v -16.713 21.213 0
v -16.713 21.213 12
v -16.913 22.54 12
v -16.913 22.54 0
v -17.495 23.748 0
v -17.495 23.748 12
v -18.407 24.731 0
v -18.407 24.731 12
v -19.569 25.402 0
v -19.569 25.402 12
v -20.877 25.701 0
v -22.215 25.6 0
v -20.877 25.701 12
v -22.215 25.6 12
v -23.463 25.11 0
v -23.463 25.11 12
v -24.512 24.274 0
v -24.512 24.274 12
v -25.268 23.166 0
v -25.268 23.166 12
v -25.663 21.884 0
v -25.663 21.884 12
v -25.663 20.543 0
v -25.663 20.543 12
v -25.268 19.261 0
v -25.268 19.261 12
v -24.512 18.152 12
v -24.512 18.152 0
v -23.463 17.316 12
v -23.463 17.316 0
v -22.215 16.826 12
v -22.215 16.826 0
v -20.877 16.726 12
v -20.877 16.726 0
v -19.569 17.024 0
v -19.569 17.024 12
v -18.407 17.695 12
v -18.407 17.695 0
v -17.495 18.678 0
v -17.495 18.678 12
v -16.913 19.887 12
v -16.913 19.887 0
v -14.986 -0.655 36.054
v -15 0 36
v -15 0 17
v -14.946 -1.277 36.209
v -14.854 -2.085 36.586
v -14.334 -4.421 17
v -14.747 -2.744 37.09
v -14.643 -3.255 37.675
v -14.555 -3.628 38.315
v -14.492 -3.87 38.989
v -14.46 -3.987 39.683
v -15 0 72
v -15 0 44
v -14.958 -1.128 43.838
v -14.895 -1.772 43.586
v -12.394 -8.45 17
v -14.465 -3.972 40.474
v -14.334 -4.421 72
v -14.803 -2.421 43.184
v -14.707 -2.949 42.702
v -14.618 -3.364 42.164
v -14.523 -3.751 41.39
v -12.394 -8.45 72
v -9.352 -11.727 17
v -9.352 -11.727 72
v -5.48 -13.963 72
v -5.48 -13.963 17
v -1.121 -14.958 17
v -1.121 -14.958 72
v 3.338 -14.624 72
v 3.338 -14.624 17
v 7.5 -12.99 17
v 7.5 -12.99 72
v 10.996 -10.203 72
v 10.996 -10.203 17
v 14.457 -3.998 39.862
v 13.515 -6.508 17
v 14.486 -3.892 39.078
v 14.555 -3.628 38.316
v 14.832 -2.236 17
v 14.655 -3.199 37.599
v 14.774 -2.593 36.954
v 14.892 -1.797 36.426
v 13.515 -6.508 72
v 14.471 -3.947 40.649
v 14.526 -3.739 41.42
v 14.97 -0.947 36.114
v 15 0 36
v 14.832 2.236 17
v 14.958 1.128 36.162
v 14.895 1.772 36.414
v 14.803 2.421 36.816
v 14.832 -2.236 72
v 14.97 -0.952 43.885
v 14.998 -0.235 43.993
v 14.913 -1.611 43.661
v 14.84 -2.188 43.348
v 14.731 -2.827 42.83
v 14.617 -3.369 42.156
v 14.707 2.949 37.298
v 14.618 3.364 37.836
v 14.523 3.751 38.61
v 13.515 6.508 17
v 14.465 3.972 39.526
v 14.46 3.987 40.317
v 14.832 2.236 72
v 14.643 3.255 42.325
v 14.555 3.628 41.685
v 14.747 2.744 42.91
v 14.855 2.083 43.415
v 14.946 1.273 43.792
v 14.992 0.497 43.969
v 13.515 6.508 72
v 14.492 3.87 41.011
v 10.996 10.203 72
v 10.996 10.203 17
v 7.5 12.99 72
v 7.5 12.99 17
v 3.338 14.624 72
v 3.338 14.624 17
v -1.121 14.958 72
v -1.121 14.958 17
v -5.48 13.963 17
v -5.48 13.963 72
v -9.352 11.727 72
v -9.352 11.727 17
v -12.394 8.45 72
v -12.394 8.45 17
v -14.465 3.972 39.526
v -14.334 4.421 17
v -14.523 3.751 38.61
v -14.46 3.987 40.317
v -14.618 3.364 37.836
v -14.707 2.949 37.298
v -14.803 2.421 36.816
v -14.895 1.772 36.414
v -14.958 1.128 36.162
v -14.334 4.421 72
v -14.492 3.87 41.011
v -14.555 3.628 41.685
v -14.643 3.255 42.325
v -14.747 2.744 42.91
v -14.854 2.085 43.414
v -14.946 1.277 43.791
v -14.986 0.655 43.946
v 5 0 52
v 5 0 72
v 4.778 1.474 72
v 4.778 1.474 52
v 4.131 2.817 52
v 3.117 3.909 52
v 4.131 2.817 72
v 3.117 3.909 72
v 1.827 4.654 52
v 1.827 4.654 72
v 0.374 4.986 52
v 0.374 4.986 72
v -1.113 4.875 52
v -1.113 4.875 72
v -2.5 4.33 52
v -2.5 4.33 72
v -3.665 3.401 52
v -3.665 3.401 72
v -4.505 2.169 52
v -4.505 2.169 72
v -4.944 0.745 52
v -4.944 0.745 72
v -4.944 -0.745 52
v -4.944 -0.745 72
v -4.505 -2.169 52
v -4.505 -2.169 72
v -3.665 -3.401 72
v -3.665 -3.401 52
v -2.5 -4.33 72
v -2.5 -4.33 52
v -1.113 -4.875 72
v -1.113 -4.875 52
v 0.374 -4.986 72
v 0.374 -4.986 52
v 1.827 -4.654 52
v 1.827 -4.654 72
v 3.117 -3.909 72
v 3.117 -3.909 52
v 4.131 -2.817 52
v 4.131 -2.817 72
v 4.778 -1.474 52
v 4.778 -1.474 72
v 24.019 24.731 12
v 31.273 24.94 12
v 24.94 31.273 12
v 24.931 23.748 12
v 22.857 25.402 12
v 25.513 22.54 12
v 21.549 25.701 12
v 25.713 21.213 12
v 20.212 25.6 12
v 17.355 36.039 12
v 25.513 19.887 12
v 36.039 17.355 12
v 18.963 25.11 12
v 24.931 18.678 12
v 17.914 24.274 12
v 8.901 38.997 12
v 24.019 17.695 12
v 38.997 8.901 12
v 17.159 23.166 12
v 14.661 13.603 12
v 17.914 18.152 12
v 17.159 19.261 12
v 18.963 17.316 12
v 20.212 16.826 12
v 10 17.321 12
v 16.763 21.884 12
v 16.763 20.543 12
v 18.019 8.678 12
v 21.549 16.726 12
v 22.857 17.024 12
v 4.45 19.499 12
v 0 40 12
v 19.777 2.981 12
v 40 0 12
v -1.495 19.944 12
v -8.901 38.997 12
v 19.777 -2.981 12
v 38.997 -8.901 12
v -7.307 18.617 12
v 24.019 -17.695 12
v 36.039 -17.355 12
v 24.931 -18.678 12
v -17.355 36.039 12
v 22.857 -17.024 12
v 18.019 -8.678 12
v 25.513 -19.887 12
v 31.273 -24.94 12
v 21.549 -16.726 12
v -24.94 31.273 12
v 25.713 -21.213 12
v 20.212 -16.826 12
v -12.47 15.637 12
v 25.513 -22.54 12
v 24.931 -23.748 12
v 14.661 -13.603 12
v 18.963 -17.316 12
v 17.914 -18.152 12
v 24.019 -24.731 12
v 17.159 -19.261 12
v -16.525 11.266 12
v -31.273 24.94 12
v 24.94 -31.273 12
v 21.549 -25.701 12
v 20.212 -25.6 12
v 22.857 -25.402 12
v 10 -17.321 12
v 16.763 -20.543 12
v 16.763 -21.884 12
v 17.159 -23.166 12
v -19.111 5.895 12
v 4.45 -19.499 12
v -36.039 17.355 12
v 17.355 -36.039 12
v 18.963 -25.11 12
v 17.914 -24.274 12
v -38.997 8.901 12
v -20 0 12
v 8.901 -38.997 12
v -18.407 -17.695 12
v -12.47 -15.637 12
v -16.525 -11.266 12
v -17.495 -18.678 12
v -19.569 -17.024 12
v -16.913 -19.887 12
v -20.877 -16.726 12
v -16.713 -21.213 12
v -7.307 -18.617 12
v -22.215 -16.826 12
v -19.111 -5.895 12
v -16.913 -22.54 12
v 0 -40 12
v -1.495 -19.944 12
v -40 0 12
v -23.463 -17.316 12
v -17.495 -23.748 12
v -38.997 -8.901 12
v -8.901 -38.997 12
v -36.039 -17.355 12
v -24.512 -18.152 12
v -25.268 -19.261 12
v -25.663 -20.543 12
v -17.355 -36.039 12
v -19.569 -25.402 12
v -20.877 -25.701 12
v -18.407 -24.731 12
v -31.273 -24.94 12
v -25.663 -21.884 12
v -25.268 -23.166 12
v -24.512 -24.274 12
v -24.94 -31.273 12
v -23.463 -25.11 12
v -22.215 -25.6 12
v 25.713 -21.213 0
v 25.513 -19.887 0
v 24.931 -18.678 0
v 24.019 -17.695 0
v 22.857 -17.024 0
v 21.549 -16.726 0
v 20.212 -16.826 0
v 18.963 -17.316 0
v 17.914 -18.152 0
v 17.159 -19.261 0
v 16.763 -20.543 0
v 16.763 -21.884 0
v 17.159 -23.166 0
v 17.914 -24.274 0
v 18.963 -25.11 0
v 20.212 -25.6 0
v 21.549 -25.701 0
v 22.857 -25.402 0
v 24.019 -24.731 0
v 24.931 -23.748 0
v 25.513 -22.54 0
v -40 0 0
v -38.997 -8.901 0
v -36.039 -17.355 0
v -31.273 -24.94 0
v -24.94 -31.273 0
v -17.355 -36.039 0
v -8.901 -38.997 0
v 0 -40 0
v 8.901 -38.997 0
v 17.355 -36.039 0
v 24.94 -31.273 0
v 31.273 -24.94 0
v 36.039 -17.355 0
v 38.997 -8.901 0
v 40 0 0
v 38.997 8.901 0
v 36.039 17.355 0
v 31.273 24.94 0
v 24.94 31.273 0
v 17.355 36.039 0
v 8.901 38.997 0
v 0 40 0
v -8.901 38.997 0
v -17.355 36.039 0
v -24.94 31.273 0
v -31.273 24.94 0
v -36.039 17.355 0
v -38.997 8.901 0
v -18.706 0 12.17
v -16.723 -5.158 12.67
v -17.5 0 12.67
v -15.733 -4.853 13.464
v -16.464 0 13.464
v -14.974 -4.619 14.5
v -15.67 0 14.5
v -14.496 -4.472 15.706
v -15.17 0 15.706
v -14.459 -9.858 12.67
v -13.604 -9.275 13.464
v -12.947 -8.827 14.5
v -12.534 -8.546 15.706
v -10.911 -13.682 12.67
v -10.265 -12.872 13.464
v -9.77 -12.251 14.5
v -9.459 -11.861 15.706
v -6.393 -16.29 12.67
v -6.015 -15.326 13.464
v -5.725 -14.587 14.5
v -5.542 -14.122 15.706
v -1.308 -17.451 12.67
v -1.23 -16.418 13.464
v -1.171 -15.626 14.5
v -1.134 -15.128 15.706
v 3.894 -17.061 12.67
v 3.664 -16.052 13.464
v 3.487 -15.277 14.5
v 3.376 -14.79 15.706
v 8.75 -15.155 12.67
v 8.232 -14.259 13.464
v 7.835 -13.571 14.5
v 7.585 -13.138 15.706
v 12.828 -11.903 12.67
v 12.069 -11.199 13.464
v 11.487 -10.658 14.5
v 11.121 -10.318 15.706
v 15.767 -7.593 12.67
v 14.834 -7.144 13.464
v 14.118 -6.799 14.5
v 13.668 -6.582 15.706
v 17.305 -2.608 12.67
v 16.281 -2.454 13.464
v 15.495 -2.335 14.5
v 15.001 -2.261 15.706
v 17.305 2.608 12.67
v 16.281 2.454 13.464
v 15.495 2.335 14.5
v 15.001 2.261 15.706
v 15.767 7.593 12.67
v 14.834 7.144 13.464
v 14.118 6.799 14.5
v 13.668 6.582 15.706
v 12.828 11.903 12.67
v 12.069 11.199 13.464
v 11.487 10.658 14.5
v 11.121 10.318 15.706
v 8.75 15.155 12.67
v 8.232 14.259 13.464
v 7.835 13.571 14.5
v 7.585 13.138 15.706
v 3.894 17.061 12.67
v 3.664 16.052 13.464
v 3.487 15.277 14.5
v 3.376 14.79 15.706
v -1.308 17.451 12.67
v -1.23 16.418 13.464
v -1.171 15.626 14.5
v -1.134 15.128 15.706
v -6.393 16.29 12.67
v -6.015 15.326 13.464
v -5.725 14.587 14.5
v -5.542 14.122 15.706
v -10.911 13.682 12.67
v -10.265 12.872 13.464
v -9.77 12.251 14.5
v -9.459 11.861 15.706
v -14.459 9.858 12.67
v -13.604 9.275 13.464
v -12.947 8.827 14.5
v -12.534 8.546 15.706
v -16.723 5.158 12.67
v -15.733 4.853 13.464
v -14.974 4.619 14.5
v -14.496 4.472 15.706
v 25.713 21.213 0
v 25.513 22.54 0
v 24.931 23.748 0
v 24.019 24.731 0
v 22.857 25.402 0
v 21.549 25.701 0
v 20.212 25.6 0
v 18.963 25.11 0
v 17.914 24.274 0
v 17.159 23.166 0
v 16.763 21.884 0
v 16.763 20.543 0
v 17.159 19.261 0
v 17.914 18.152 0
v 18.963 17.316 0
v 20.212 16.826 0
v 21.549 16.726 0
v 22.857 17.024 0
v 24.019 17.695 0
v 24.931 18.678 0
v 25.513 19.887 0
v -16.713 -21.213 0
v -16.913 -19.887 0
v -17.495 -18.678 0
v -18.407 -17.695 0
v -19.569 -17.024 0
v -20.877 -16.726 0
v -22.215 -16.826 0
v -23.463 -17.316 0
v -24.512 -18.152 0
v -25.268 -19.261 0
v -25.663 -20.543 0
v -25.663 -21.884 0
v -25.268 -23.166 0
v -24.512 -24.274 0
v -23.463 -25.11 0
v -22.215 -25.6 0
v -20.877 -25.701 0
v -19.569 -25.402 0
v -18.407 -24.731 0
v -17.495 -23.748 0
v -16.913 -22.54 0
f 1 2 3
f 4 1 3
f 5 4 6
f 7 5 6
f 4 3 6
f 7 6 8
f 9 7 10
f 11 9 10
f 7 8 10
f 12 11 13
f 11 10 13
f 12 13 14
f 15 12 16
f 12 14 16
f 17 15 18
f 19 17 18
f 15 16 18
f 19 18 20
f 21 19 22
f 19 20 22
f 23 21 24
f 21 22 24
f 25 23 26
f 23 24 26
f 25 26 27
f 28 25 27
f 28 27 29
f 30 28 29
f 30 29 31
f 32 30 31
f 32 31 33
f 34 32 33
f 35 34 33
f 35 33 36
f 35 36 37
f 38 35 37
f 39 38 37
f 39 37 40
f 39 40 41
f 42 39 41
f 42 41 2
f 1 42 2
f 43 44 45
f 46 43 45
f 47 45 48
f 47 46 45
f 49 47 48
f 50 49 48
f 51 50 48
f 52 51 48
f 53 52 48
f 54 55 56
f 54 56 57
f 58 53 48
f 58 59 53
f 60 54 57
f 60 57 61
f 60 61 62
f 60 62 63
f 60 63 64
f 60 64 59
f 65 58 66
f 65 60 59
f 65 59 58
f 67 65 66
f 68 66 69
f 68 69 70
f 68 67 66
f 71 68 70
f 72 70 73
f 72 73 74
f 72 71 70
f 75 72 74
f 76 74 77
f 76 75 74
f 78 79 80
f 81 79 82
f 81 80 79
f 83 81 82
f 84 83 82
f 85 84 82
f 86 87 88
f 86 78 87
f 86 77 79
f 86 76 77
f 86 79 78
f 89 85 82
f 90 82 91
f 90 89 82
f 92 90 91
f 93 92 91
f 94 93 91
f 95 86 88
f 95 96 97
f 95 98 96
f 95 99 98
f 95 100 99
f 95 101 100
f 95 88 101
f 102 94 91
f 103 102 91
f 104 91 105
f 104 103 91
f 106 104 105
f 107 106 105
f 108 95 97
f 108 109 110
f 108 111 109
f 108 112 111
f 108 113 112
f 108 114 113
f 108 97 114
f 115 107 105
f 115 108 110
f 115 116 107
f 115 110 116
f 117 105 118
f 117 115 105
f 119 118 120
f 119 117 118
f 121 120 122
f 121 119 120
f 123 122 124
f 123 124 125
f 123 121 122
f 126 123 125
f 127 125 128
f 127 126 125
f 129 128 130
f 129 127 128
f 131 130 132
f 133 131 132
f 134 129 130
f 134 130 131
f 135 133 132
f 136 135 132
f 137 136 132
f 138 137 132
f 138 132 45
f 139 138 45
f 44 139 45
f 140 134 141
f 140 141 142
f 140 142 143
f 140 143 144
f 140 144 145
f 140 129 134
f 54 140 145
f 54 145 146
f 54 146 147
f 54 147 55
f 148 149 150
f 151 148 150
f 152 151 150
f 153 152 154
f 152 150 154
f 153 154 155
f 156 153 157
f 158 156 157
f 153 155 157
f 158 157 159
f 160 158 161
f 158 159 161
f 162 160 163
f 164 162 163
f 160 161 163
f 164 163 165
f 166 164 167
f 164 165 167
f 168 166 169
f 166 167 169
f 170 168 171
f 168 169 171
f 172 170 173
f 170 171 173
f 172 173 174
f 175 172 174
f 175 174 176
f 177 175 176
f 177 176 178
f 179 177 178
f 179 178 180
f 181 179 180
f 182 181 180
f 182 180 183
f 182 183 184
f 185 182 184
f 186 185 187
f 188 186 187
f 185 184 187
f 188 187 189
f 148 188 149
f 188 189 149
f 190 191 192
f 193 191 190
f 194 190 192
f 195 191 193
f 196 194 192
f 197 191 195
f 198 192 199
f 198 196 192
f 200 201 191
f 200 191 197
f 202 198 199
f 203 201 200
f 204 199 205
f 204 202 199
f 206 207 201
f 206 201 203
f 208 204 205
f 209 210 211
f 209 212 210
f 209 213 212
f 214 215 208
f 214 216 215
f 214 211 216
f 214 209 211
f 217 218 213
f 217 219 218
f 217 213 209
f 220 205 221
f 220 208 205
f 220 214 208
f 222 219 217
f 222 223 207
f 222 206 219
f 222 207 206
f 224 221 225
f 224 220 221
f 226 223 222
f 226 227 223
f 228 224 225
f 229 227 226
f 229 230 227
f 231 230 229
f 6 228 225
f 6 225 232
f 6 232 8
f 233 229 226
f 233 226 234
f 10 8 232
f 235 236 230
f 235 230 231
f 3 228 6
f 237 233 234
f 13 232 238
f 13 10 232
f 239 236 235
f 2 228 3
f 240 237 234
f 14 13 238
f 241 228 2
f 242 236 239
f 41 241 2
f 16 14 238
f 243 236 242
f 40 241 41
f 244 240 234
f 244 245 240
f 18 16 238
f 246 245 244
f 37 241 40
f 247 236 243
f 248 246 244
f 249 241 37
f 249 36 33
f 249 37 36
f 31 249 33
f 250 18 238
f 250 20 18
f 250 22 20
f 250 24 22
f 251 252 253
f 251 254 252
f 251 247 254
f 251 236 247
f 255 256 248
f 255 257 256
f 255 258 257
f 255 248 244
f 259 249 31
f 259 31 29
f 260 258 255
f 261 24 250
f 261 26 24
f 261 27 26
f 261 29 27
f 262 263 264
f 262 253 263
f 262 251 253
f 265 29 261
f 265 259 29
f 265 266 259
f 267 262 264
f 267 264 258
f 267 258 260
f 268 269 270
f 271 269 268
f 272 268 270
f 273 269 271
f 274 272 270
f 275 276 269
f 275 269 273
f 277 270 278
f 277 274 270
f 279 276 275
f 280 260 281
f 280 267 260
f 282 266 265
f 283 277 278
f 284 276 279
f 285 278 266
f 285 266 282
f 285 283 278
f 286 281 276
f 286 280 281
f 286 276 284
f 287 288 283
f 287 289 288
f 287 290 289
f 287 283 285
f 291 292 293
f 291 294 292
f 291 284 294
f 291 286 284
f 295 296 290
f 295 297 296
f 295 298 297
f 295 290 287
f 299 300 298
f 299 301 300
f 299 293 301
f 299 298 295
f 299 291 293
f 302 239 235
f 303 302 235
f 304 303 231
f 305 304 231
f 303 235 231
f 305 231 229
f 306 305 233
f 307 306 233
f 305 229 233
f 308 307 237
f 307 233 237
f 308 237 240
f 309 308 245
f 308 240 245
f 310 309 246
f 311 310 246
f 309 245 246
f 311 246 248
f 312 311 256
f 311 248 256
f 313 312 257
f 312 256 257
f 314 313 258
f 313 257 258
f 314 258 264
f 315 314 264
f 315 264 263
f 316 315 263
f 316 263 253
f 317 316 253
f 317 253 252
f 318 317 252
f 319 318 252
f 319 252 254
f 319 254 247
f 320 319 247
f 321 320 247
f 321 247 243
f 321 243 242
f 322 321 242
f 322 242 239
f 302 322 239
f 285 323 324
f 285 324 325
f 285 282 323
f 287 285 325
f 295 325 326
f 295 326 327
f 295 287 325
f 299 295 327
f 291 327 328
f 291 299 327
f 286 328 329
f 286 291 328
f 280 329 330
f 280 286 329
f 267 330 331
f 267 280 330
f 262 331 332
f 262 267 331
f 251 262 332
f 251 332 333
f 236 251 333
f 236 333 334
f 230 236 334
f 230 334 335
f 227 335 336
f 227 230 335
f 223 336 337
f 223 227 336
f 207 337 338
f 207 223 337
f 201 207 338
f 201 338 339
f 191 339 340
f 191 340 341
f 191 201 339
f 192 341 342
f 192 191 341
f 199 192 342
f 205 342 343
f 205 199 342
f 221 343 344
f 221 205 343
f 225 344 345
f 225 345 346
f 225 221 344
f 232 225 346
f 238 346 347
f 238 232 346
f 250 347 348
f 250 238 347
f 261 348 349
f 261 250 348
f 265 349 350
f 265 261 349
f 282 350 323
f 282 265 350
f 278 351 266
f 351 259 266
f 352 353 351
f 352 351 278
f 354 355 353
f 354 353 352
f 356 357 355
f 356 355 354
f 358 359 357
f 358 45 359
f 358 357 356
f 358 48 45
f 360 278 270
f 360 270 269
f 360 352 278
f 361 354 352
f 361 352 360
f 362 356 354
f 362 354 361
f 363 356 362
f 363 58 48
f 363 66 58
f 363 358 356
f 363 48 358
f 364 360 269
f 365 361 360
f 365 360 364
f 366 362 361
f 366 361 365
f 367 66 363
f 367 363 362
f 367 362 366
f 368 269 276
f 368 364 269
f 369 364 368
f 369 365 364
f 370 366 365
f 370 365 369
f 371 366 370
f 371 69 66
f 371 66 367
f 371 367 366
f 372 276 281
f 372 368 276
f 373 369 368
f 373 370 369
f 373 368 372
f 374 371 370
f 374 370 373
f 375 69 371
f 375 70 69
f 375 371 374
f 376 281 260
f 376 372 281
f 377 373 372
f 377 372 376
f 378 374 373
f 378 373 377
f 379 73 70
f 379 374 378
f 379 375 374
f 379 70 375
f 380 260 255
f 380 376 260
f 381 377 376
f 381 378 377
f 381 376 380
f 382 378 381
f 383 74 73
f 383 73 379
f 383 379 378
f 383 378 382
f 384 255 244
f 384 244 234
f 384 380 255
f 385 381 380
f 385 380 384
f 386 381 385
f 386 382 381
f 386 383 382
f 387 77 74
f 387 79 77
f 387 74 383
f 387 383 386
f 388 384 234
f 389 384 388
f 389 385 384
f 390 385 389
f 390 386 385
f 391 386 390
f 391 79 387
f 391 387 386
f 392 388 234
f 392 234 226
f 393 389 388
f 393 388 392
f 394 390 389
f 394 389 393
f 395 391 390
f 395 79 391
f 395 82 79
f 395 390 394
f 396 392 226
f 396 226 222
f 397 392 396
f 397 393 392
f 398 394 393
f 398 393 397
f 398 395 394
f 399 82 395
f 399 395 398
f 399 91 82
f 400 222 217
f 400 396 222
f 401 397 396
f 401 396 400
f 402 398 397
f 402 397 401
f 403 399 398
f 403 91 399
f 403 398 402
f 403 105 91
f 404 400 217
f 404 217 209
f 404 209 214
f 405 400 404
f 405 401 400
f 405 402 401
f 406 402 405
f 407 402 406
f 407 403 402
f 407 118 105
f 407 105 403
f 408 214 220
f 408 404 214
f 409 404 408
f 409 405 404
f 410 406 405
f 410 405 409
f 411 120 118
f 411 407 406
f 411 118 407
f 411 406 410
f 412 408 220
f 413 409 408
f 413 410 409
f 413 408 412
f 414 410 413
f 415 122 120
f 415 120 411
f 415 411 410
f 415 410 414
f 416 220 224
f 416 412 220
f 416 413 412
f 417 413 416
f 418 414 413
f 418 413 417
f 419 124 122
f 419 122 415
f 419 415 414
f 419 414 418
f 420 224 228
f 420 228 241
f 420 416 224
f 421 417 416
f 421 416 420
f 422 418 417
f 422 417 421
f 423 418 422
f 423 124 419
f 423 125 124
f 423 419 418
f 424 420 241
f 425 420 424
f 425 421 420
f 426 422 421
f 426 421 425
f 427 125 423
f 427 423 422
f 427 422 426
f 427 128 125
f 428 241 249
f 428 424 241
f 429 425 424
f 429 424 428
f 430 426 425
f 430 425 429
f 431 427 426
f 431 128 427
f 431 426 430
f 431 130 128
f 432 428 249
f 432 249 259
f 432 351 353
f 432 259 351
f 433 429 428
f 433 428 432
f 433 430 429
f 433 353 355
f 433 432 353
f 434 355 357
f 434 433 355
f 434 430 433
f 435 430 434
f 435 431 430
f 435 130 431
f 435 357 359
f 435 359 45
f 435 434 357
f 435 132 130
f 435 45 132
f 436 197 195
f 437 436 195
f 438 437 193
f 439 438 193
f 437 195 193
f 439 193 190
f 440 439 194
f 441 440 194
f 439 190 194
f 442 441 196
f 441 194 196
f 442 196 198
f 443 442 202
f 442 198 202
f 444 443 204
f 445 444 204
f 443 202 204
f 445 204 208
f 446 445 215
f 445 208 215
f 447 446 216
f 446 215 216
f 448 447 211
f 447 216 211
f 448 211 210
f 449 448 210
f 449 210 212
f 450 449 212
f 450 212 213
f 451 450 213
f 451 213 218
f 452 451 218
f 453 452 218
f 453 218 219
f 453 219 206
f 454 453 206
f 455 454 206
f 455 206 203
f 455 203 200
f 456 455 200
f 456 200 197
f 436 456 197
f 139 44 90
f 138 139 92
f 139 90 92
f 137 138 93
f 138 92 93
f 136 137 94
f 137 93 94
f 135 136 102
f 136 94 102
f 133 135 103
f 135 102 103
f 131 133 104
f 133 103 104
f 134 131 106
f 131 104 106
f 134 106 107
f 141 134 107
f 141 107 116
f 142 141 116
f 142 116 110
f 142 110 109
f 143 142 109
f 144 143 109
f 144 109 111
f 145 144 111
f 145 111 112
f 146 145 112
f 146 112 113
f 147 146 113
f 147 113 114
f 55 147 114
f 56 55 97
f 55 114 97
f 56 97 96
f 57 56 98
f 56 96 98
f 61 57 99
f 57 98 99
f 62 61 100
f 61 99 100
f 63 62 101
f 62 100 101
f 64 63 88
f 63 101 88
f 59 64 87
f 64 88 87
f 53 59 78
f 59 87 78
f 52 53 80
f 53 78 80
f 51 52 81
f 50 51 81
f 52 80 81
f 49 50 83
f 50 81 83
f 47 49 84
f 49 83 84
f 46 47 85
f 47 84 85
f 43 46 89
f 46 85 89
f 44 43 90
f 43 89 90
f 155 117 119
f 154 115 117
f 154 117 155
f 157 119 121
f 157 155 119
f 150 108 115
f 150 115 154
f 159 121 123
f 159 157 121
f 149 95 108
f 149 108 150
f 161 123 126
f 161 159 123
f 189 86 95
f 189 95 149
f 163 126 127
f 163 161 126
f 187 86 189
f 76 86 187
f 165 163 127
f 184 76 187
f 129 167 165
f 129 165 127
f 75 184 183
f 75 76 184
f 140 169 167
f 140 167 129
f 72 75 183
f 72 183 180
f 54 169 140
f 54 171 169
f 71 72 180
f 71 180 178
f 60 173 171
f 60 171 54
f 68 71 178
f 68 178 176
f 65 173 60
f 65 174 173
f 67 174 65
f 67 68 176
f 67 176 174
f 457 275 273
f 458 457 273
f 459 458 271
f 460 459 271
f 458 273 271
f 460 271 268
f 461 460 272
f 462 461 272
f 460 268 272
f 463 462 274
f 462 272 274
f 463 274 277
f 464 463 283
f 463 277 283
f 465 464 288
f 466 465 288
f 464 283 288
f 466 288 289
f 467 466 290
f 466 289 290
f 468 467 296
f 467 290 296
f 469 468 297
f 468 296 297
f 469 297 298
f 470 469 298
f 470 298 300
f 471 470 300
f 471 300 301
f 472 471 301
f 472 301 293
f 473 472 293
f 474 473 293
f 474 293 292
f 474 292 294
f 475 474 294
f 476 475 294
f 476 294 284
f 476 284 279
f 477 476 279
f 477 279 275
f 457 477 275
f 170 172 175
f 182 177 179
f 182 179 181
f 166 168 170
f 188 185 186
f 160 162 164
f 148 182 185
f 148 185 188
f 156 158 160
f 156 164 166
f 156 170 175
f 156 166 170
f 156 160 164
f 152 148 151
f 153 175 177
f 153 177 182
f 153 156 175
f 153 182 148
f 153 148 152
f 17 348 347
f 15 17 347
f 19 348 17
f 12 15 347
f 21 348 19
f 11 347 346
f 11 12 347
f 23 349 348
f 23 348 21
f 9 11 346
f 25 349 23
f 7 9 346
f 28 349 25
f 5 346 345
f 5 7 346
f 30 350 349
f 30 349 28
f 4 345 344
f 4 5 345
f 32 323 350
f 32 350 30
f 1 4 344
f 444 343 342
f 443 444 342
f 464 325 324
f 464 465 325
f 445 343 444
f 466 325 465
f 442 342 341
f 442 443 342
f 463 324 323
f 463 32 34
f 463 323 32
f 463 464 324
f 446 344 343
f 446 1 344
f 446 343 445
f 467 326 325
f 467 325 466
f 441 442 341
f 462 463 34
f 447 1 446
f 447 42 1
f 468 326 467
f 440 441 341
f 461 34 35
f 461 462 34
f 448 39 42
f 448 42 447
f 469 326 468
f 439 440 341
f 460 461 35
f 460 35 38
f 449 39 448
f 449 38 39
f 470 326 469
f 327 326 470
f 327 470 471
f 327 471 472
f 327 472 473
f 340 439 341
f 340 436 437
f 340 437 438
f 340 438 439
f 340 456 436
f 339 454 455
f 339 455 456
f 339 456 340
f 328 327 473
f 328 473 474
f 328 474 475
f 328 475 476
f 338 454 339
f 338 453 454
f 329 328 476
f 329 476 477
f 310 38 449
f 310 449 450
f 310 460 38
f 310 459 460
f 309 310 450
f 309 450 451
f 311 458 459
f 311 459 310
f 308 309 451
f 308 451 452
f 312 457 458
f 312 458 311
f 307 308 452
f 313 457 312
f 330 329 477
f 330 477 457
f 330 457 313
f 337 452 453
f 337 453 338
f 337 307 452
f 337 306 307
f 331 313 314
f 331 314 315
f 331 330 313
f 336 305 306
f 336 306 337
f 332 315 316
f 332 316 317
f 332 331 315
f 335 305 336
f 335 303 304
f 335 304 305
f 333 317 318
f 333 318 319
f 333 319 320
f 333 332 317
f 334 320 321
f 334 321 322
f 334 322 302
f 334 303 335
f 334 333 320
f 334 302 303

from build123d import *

# Parameters (mm, degrees)
SKETCH_2_R          = 5
CUT_EXTRUDE_1_DEPTH = 20
SKETCH_3_R          = 4
CUT_EXTRUDE_2_DEPTH = 81
SKETCH_4_R          = 4.5
CUT_EXTRUDE_3_DEPTH = 83.462112585
FILLET_1_R          = 5


with BuildPart() as part:
    # 草图1 → 旋转1 (revolve)
    with BuildSketch(Plane(origin=(0, 0, 0), x_dir=(1, 0, 0), z_dir=(0, 1, 0)), mode=Mode.PRIVATE) as revolve_1_sk:
        Polygon((0, 0), (40, 0), (40, -12), (15, -12), (15, -72), (0, -72), align=None)
    revolve(revolve_1_sk.sketch.rotate(Axis((0, 0, 0), (0, 0, 1)), 180), axis=Axis((0, 0, 0), (0, 0, 1)))

    # 草图2 → 切除-拉伸1 (cut)
    with BuildSketch(Plane.XY.offset(72)):
        Circle(SKETCH_2_R)
    extrude(amount=-CUT_EXTRUDE_1_DEPTH, mode=Mode.SUBTRACT)

    # 草图3 → 切除-拉伸2 (cut, symmetric)
    with BuildSketch(Plane(origin=(0, 0, 0), x_dir=(0, 0, -1), z_dir=(1, 0, 0))):
        with Locations((-40, 0)):
            Circle(SKETCH_3_R)
    extrude(amount=CUT_EXTRUDE_2_DEPTH, both=True, mode=Mode.SUBTRACT)

    # 草图4 → 切除-拉伸3 (cut, through all)
    with BuildSketch(Plane.XY.offset(12)):
        with Locations((21.213203, 21.213203)):
            Circle(SKETCH_4_R)
        with Locations((-21.213203, 21.213203)):
            Circle(SKETCH_4_R)
        with Locations((-21.213203, -21.213203)):
            Circle(SKETCH_4_R)
        with Locations((21.213203, -21.213203)):
            Circle(SKETCH_4_R)
    extrude(amount=-CUT_EXTRUDE_3_DEPTH, mode=Mode.SUBTRACT)

    # 圆角1
    fillet_1_edges = [part.edges().sort_by_distance(p)[0] for p in [
        (15, 0, 12),
    ]]
    fillet(fillet_1_edges, radius=FILLET_1_R)


solid = part.part
